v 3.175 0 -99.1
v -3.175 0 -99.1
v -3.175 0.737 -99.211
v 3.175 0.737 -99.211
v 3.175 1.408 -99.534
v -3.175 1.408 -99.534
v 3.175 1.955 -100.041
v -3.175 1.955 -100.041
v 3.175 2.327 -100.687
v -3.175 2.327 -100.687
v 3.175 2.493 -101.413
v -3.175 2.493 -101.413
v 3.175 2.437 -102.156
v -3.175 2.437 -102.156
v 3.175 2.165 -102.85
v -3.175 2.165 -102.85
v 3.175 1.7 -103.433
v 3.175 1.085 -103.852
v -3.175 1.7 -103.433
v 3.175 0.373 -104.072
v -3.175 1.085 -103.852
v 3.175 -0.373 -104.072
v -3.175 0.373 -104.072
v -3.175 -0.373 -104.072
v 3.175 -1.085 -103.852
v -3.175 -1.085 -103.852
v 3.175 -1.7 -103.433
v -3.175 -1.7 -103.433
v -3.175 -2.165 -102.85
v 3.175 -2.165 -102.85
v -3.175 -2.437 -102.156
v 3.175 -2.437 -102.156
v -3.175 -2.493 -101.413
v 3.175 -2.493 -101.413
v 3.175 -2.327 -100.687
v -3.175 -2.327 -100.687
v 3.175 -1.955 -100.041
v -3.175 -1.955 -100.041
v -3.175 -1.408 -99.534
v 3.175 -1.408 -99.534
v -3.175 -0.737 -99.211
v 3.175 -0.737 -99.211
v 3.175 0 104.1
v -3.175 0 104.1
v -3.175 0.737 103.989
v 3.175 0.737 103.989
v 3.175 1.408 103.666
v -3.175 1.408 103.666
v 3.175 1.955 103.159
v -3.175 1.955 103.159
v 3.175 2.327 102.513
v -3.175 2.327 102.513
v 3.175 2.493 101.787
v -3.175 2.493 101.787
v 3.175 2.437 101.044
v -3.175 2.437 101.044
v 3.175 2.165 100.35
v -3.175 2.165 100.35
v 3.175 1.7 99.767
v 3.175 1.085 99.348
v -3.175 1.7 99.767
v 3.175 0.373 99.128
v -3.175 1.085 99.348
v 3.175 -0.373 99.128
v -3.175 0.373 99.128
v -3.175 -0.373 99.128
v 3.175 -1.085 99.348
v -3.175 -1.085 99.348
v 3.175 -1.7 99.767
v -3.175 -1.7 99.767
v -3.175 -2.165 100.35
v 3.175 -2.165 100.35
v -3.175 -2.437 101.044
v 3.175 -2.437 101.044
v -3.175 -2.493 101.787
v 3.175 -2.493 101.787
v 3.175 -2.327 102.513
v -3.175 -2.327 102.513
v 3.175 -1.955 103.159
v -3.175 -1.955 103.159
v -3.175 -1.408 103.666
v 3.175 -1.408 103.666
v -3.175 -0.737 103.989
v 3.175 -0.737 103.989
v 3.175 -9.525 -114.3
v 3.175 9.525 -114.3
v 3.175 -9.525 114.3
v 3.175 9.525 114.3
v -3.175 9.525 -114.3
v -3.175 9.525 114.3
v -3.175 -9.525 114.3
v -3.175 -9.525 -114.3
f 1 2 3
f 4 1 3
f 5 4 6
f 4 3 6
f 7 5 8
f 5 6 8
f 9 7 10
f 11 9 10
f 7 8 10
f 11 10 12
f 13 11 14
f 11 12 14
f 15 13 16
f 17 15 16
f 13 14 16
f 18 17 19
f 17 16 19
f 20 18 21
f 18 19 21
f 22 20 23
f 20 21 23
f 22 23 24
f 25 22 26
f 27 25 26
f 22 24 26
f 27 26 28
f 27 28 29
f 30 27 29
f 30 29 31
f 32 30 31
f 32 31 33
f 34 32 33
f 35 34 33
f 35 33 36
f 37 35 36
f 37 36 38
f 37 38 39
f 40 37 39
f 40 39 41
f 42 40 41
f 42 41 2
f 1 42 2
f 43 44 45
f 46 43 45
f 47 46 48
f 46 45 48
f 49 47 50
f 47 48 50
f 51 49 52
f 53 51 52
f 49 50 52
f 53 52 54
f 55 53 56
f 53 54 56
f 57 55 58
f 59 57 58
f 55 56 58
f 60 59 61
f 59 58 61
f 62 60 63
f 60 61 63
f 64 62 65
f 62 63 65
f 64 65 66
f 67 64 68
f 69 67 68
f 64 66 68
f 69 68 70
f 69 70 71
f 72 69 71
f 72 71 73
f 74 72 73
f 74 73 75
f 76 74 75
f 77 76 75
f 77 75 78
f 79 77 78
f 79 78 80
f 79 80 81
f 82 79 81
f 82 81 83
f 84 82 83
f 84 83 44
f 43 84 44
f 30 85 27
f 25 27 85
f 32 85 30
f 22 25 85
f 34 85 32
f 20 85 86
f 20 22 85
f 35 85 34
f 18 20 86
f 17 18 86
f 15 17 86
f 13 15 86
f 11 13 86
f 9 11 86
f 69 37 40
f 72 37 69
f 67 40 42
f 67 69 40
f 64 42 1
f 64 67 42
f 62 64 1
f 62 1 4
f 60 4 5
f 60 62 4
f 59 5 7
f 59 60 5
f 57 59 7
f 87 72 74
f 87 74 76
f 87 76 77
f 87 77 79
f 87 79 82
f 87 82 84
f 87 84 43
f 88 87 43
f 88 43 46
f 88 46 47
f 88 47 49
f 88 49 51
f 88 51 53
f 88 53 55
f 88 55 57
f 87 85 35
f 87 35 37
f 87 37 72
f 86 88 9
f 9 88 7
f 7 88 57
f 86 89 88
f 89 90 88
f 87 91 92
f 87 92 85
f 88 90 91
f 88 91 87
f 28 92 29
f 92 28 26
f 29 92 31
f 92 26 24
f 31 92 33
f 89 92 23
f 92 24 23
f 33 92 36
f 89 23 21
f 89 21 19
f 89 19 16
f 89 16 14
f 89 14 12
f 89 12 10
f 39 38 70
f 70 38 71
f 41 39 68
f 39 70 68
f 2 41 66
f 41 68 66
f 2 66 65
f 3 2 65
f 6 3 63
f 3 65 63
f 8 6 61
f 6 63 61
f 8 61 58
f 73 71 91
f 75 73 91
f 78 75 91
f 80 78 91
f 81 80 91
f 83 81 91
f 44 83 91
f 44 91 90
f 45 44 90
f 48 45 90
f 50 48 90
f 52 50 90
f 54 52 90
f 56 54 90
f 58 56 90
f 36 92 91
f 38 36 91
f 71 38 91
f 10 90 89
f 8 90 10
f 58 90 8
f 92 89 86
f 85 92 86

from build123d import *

# Parameters (mm, degrees)
SKETCH1_W                 = 6.35
SKETCH1_H                 = 19.05
EXTRUDE1_DEPTH            = 114.3
M6X1_0_TAPPED_HOLE1_D     = 5
M6X1_0_TAPPED_HOLE1_DEPTH = 6.35


with BuildPart() as part:
    # Sketch1 → Extrude1 (new body, symmetric)
    with BuildSketch(Plane.XY):
        Rectangle(SKETCH1_W, SKETCH1_H)
    extrude(amount=EXTRUDE1_DEPTH, both=True)

    # M6x1.0 Tapped Hole1
    with Locations(Plane(origin=(3.175, 0, 0), x_dir=(0, 0, -1), z_dir=(1, 0, 0))):
        with Locations((-101.6, 0), (101.6, 0)):
            Hole(M6X1_0_TAPPED_HOLE1_D / 2, depth=M6X1_0_TAPPED_HOLE1_DEPTH)


solid = part.part
